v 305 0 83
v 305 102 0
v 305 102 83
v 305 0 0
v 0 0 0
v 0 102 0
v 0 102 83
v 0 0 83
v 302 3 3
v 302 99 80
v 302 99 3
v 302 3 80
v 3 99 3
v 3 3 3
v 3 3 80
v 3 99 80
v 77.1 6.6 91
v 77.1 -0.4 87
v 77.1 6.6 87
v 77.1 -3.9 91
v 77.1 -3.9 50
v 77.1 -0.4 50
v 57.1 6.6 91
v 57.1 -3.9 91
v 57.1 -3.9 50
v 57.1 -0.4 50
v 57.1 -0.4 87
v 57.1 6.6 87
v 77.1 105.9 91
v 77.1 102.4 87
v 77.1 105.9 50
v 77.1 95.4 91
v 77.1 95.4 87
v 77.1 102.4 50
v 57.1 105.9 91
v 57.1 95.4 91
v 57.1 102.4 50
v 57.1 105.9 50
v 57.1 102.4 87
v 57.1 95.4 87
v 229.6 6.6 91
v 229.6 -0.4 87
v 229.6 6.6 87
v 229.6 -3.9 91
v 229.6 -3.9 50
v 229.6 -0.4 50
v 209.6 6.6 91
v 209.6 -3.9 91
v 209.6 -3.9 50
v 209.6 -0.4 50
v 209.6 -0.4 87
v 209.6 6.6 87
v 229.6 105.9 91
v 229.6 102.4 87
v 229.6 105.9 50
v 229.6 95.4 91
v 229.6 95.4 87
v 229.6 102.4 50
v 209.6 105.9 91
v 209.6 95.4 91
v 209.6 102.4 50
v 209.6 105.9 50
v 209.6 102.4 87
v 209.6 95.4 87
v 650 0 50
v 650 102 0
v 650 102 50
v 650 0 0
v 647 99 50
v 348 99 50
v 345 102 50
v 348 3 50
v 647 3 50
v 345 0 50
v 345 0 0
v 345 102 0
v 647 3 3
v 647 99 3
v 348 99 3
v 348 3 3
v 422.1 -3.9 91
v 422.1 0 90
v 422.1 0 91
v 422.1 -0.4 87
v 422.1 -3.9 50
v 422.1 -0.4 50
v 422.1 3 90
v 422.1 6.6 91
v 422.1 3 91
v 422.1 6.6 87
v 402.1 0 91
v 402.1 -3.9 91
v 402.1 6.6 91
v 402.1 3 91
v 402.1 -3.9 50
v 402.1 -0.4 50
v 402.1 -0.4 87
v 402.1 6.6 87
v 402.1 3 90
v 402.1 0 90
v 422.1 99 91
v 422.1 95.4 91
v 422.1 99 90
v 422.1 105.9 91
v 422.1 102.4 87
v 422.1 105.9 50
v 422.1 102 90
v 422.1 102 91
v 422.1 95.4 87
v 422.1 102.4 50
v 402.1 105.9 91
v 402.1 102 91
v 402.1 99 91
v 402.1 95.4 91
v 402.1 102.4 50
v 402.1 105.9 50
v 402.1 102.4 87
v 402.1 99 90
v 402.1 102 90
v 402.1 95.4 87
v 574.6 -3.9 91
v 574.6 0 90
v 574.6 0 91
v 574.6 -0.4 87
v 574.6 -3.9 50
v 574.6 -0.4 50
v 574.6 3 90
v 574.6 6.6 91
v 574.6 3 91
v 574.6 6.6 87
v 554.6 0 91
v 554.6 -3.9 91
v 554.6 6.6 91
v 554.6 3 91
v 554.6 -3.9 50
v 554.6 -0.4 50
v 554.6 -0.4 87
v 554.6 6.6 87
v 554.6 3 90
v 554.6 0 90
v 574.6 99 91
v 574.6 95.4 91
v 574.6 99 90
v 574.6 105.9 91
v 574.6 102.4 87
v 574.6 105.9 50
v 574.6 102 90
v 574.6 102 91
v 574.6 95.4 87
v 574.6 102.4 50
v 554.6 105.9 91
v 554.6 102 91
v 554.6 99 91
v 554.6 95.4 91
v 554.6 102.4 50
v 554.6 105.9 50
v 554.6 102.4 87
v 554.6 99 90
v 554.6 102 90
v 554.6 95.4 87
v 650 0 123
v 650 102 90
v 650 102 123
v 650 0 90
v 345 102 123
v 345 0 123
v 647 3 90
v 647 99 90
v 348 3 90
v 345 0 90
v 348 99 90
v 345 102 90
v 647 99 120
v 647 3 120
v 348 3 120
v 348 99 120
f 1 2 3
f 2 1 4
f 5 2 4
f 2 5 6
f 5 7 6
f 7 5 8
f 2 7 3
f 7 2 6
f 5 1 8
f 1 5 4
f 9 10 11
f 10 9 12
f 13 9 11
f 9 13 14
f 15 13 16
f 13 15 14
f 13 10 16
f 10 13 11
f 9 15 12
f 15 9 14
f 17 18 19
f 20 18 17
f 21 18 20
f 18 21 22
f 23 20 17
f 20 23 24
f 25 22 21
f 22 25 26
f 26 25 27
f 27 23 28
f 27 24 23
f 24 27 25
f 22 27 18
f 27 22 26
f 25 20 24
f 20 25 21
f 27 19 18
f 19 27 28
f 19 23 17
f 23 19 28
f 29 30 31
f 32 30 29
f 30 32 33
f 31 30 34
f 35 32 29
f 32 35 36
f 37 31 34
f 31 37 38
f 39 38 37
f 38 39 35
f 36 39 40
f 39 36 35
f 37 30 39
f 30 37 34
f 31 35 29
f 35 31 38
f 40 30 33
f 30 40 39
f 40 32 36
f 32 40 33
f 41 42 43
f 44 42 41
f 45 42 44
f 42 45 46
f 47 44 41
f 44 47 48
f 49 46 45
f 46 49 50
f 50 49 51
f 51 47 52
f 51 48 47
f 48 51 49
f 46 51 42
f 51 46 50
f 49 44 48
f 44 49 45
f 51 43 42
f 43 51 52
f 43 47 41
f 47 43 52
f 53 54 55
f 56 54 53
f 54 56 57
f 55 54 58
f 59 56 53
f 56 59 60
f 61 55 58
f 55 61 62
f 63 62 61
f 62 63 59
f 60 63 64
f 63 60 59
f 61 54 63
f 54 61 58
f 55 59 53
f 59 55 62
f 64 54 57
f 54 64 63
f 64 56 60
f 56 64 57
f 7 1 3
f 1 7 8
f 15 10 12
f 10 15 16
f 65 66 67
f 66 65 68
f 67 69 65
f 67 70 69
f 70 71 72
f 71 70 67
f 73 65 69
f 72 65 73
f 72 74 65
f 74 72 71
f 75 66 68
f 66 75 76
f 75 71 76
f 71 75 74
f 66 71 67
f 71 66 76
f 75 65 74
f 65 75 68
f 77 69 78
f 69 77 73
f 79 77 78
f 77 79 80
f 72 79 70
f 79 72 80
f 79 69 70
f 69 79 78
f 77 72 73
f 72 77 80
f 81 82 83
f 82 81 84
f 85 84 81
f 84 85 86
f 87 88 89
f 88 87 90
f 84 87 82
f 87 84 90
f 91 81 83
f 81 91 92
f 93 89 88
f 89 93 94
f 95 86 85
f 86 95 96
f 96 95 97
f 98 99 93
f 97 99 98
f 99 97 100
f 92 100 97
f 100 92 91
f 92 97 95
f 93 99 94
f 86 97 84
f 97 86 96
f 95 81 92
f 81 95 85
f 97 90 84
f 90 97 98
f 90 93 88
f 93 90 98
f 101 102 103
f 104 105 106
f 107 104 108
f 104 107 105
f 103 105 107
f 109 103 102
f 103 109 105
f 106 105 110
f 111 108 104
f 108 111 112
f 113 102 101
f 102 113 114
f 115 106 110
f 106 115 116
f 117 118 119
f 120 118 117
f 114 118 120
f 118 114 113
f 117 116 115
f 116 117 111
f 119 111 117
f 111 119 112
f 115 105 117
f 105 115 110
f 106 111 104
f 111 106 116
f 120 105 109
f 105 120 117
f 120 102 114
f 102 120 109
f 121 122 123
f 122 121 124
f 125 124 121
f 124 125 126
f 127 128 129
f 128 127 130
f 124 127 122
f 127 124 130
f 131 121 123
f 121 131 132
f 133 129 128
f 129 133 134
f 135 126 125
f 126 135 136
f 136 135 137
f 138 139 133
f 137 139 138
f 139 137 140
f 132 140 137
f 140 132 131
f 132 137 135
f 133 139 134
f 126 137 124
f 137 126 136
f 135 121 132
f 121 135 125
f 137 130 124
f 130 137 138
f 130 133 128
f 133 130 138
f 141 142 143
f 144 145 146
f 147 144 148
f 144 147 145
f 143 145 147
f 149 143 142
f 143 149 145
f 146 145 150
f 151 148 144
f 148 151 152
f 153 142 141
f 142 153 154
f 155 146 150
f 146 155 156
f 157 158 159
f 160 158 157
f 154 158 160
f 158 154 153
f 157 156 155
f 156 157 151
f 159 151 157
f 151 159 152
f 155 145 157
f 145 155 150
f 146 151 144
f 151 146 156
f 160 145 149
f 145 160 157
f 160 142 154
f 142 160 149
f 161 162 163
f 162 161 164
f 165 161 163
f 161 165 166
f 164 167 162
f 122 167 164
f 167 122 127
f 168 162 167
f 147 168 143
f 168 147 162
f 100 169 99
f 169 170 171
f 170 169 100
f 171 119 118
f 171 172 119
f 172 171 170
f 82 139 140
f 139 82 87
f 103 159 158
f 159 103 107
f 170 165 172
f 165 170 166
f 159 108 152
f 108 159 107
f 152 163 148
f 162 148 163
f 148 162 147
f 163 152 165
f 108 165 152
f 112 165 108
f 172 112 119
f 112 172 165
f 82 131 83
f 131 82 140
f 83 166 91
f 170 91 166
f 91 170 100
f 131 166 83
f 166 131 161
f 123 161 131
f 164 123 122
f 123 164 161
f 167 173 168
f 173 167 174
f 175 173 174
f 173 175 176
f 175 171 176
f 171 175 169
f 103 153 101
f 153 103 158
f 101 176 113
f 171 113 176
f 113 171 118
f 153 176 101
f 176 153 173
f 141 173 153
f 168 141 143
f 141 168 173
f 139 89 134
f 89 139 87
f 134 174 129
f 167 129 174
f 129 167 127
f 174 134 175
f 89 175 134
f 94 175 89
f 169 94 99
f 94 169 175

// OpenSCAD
// 01_twin_hooks.scad
// RETROFIT: Twin hook-over-rim fingers — 2 per long side (4 fingers total per side).
// Tall J-shaped arms rise from the NEW tray's outer wall, clear the top tray height,
// then curl inward with a flat lip that bears down on the top rim (z=83).
// TOP TRAY FIXED — NO geometry added to it. All clips integral to NEW tray.
//
// LEFT side: ENGAGED (top tray seated, lips over rim)
// RIGHT side: EXPLODED (top tray lifted 40 mm clear)

// ── master dims ─────────────────────────────────────────────────
TW = 305; TD = 102; TH = 33;   // top tray outer (FIXED)
NW = 305; ND = 102; NH = 50;   // new tray outer
wall = 3;

// ── hook geometry ───────────────────────────────────────────────
hk_w    = 20;    // finger width along X
hk_t    = 3.5;  // arm wall thickness
hk_h    = TH + 8; // arm height from z=NH upward (surpasses rim by 8 mm)
lip_ext = 7;     // lip horizontal reach over top rim
lip_t   = 4;     // lip vertical thickness
gap     = 0.4;   // clearance between hook arm inner face and top tray outer face

// x-positions of two hook pairs
x_pos_L = NW * 0.22;
x_pos_R = NW * 0.72;

// ── colours ─────────────────────────────────────────────────────
C_new  = "#1565C0";  // blue  — new tray
C_top  = "#90A4AE";  // grey  — top tray (fixed)
C_clip = "#E65100";  // deep orange — hook arms (on new tray)

sep = NW + 40;  // separation between engaged and exploded scenes

// ────────────────────────────────────────────────────────────────
module new_tray_body() {
    color(C_new)
    difference() {
        cube([NW, ND, NH]);
        translate([wall, wall, wall])
            cube([NW-2*wall, ND-2*wall, NH]);
    }
}

module top_tray_body(dz=0) {
    color(C_top)
    translate([0, 0, NH + dz])
    difference() {
        cube([TW, TD, TH]);
        translate([wall, wall, 0])
            cube([TW-2*wall, TD-2*wall, TH-wall]);
    }
}

// One J-hook finger.  Local origin at bottom of arm base.
// Arm rises in +Z, lip curls toward +Y (inward from front face).
module hook_finger_base() {
    color(C_clip) {
        // vertical arm
        cube([hk_w, hk_t, hk_h]);
        // rim lip at top — extends inward (+Y)
        translate([0, 0, hk_h - lip_t])
            cube([hk_w, hk_t + lip_ext, lip_t]);
    }
}

module hooks_on_new_tray() {
    for (xp = [x_pos_L, x_pos_R]) {
        // FRONT side (y=0): arm outer face at y = -gap, extends to y = -(hk_t+gap)
        translate([xp - hk_w/2, -(hk_t + gap), NH])
            hook_finger_base();

        // BACK side (y=ND): mirror front
        translate([xp - hk_w/2, ND + gap + hk_t, NH])
            mirror([0,1,0])
            hook_finger_base();
    }
}

// ── LEFT: Engaged ────────────────────────────────────────────────
translate([0, 0, 0]) {
    new_tray_body();
    hooks_on_new_tray();
    top_tray_body(0);
}

// ── RIGHT: Exploded (top tray lifted) ───────────────────────────
translate([sep, 0, 0]) {
    new_tray_body();
    hooks_on_new_tray();
    top_tray_body(40);   // top tray lifted 40 mm above engaged position
}
